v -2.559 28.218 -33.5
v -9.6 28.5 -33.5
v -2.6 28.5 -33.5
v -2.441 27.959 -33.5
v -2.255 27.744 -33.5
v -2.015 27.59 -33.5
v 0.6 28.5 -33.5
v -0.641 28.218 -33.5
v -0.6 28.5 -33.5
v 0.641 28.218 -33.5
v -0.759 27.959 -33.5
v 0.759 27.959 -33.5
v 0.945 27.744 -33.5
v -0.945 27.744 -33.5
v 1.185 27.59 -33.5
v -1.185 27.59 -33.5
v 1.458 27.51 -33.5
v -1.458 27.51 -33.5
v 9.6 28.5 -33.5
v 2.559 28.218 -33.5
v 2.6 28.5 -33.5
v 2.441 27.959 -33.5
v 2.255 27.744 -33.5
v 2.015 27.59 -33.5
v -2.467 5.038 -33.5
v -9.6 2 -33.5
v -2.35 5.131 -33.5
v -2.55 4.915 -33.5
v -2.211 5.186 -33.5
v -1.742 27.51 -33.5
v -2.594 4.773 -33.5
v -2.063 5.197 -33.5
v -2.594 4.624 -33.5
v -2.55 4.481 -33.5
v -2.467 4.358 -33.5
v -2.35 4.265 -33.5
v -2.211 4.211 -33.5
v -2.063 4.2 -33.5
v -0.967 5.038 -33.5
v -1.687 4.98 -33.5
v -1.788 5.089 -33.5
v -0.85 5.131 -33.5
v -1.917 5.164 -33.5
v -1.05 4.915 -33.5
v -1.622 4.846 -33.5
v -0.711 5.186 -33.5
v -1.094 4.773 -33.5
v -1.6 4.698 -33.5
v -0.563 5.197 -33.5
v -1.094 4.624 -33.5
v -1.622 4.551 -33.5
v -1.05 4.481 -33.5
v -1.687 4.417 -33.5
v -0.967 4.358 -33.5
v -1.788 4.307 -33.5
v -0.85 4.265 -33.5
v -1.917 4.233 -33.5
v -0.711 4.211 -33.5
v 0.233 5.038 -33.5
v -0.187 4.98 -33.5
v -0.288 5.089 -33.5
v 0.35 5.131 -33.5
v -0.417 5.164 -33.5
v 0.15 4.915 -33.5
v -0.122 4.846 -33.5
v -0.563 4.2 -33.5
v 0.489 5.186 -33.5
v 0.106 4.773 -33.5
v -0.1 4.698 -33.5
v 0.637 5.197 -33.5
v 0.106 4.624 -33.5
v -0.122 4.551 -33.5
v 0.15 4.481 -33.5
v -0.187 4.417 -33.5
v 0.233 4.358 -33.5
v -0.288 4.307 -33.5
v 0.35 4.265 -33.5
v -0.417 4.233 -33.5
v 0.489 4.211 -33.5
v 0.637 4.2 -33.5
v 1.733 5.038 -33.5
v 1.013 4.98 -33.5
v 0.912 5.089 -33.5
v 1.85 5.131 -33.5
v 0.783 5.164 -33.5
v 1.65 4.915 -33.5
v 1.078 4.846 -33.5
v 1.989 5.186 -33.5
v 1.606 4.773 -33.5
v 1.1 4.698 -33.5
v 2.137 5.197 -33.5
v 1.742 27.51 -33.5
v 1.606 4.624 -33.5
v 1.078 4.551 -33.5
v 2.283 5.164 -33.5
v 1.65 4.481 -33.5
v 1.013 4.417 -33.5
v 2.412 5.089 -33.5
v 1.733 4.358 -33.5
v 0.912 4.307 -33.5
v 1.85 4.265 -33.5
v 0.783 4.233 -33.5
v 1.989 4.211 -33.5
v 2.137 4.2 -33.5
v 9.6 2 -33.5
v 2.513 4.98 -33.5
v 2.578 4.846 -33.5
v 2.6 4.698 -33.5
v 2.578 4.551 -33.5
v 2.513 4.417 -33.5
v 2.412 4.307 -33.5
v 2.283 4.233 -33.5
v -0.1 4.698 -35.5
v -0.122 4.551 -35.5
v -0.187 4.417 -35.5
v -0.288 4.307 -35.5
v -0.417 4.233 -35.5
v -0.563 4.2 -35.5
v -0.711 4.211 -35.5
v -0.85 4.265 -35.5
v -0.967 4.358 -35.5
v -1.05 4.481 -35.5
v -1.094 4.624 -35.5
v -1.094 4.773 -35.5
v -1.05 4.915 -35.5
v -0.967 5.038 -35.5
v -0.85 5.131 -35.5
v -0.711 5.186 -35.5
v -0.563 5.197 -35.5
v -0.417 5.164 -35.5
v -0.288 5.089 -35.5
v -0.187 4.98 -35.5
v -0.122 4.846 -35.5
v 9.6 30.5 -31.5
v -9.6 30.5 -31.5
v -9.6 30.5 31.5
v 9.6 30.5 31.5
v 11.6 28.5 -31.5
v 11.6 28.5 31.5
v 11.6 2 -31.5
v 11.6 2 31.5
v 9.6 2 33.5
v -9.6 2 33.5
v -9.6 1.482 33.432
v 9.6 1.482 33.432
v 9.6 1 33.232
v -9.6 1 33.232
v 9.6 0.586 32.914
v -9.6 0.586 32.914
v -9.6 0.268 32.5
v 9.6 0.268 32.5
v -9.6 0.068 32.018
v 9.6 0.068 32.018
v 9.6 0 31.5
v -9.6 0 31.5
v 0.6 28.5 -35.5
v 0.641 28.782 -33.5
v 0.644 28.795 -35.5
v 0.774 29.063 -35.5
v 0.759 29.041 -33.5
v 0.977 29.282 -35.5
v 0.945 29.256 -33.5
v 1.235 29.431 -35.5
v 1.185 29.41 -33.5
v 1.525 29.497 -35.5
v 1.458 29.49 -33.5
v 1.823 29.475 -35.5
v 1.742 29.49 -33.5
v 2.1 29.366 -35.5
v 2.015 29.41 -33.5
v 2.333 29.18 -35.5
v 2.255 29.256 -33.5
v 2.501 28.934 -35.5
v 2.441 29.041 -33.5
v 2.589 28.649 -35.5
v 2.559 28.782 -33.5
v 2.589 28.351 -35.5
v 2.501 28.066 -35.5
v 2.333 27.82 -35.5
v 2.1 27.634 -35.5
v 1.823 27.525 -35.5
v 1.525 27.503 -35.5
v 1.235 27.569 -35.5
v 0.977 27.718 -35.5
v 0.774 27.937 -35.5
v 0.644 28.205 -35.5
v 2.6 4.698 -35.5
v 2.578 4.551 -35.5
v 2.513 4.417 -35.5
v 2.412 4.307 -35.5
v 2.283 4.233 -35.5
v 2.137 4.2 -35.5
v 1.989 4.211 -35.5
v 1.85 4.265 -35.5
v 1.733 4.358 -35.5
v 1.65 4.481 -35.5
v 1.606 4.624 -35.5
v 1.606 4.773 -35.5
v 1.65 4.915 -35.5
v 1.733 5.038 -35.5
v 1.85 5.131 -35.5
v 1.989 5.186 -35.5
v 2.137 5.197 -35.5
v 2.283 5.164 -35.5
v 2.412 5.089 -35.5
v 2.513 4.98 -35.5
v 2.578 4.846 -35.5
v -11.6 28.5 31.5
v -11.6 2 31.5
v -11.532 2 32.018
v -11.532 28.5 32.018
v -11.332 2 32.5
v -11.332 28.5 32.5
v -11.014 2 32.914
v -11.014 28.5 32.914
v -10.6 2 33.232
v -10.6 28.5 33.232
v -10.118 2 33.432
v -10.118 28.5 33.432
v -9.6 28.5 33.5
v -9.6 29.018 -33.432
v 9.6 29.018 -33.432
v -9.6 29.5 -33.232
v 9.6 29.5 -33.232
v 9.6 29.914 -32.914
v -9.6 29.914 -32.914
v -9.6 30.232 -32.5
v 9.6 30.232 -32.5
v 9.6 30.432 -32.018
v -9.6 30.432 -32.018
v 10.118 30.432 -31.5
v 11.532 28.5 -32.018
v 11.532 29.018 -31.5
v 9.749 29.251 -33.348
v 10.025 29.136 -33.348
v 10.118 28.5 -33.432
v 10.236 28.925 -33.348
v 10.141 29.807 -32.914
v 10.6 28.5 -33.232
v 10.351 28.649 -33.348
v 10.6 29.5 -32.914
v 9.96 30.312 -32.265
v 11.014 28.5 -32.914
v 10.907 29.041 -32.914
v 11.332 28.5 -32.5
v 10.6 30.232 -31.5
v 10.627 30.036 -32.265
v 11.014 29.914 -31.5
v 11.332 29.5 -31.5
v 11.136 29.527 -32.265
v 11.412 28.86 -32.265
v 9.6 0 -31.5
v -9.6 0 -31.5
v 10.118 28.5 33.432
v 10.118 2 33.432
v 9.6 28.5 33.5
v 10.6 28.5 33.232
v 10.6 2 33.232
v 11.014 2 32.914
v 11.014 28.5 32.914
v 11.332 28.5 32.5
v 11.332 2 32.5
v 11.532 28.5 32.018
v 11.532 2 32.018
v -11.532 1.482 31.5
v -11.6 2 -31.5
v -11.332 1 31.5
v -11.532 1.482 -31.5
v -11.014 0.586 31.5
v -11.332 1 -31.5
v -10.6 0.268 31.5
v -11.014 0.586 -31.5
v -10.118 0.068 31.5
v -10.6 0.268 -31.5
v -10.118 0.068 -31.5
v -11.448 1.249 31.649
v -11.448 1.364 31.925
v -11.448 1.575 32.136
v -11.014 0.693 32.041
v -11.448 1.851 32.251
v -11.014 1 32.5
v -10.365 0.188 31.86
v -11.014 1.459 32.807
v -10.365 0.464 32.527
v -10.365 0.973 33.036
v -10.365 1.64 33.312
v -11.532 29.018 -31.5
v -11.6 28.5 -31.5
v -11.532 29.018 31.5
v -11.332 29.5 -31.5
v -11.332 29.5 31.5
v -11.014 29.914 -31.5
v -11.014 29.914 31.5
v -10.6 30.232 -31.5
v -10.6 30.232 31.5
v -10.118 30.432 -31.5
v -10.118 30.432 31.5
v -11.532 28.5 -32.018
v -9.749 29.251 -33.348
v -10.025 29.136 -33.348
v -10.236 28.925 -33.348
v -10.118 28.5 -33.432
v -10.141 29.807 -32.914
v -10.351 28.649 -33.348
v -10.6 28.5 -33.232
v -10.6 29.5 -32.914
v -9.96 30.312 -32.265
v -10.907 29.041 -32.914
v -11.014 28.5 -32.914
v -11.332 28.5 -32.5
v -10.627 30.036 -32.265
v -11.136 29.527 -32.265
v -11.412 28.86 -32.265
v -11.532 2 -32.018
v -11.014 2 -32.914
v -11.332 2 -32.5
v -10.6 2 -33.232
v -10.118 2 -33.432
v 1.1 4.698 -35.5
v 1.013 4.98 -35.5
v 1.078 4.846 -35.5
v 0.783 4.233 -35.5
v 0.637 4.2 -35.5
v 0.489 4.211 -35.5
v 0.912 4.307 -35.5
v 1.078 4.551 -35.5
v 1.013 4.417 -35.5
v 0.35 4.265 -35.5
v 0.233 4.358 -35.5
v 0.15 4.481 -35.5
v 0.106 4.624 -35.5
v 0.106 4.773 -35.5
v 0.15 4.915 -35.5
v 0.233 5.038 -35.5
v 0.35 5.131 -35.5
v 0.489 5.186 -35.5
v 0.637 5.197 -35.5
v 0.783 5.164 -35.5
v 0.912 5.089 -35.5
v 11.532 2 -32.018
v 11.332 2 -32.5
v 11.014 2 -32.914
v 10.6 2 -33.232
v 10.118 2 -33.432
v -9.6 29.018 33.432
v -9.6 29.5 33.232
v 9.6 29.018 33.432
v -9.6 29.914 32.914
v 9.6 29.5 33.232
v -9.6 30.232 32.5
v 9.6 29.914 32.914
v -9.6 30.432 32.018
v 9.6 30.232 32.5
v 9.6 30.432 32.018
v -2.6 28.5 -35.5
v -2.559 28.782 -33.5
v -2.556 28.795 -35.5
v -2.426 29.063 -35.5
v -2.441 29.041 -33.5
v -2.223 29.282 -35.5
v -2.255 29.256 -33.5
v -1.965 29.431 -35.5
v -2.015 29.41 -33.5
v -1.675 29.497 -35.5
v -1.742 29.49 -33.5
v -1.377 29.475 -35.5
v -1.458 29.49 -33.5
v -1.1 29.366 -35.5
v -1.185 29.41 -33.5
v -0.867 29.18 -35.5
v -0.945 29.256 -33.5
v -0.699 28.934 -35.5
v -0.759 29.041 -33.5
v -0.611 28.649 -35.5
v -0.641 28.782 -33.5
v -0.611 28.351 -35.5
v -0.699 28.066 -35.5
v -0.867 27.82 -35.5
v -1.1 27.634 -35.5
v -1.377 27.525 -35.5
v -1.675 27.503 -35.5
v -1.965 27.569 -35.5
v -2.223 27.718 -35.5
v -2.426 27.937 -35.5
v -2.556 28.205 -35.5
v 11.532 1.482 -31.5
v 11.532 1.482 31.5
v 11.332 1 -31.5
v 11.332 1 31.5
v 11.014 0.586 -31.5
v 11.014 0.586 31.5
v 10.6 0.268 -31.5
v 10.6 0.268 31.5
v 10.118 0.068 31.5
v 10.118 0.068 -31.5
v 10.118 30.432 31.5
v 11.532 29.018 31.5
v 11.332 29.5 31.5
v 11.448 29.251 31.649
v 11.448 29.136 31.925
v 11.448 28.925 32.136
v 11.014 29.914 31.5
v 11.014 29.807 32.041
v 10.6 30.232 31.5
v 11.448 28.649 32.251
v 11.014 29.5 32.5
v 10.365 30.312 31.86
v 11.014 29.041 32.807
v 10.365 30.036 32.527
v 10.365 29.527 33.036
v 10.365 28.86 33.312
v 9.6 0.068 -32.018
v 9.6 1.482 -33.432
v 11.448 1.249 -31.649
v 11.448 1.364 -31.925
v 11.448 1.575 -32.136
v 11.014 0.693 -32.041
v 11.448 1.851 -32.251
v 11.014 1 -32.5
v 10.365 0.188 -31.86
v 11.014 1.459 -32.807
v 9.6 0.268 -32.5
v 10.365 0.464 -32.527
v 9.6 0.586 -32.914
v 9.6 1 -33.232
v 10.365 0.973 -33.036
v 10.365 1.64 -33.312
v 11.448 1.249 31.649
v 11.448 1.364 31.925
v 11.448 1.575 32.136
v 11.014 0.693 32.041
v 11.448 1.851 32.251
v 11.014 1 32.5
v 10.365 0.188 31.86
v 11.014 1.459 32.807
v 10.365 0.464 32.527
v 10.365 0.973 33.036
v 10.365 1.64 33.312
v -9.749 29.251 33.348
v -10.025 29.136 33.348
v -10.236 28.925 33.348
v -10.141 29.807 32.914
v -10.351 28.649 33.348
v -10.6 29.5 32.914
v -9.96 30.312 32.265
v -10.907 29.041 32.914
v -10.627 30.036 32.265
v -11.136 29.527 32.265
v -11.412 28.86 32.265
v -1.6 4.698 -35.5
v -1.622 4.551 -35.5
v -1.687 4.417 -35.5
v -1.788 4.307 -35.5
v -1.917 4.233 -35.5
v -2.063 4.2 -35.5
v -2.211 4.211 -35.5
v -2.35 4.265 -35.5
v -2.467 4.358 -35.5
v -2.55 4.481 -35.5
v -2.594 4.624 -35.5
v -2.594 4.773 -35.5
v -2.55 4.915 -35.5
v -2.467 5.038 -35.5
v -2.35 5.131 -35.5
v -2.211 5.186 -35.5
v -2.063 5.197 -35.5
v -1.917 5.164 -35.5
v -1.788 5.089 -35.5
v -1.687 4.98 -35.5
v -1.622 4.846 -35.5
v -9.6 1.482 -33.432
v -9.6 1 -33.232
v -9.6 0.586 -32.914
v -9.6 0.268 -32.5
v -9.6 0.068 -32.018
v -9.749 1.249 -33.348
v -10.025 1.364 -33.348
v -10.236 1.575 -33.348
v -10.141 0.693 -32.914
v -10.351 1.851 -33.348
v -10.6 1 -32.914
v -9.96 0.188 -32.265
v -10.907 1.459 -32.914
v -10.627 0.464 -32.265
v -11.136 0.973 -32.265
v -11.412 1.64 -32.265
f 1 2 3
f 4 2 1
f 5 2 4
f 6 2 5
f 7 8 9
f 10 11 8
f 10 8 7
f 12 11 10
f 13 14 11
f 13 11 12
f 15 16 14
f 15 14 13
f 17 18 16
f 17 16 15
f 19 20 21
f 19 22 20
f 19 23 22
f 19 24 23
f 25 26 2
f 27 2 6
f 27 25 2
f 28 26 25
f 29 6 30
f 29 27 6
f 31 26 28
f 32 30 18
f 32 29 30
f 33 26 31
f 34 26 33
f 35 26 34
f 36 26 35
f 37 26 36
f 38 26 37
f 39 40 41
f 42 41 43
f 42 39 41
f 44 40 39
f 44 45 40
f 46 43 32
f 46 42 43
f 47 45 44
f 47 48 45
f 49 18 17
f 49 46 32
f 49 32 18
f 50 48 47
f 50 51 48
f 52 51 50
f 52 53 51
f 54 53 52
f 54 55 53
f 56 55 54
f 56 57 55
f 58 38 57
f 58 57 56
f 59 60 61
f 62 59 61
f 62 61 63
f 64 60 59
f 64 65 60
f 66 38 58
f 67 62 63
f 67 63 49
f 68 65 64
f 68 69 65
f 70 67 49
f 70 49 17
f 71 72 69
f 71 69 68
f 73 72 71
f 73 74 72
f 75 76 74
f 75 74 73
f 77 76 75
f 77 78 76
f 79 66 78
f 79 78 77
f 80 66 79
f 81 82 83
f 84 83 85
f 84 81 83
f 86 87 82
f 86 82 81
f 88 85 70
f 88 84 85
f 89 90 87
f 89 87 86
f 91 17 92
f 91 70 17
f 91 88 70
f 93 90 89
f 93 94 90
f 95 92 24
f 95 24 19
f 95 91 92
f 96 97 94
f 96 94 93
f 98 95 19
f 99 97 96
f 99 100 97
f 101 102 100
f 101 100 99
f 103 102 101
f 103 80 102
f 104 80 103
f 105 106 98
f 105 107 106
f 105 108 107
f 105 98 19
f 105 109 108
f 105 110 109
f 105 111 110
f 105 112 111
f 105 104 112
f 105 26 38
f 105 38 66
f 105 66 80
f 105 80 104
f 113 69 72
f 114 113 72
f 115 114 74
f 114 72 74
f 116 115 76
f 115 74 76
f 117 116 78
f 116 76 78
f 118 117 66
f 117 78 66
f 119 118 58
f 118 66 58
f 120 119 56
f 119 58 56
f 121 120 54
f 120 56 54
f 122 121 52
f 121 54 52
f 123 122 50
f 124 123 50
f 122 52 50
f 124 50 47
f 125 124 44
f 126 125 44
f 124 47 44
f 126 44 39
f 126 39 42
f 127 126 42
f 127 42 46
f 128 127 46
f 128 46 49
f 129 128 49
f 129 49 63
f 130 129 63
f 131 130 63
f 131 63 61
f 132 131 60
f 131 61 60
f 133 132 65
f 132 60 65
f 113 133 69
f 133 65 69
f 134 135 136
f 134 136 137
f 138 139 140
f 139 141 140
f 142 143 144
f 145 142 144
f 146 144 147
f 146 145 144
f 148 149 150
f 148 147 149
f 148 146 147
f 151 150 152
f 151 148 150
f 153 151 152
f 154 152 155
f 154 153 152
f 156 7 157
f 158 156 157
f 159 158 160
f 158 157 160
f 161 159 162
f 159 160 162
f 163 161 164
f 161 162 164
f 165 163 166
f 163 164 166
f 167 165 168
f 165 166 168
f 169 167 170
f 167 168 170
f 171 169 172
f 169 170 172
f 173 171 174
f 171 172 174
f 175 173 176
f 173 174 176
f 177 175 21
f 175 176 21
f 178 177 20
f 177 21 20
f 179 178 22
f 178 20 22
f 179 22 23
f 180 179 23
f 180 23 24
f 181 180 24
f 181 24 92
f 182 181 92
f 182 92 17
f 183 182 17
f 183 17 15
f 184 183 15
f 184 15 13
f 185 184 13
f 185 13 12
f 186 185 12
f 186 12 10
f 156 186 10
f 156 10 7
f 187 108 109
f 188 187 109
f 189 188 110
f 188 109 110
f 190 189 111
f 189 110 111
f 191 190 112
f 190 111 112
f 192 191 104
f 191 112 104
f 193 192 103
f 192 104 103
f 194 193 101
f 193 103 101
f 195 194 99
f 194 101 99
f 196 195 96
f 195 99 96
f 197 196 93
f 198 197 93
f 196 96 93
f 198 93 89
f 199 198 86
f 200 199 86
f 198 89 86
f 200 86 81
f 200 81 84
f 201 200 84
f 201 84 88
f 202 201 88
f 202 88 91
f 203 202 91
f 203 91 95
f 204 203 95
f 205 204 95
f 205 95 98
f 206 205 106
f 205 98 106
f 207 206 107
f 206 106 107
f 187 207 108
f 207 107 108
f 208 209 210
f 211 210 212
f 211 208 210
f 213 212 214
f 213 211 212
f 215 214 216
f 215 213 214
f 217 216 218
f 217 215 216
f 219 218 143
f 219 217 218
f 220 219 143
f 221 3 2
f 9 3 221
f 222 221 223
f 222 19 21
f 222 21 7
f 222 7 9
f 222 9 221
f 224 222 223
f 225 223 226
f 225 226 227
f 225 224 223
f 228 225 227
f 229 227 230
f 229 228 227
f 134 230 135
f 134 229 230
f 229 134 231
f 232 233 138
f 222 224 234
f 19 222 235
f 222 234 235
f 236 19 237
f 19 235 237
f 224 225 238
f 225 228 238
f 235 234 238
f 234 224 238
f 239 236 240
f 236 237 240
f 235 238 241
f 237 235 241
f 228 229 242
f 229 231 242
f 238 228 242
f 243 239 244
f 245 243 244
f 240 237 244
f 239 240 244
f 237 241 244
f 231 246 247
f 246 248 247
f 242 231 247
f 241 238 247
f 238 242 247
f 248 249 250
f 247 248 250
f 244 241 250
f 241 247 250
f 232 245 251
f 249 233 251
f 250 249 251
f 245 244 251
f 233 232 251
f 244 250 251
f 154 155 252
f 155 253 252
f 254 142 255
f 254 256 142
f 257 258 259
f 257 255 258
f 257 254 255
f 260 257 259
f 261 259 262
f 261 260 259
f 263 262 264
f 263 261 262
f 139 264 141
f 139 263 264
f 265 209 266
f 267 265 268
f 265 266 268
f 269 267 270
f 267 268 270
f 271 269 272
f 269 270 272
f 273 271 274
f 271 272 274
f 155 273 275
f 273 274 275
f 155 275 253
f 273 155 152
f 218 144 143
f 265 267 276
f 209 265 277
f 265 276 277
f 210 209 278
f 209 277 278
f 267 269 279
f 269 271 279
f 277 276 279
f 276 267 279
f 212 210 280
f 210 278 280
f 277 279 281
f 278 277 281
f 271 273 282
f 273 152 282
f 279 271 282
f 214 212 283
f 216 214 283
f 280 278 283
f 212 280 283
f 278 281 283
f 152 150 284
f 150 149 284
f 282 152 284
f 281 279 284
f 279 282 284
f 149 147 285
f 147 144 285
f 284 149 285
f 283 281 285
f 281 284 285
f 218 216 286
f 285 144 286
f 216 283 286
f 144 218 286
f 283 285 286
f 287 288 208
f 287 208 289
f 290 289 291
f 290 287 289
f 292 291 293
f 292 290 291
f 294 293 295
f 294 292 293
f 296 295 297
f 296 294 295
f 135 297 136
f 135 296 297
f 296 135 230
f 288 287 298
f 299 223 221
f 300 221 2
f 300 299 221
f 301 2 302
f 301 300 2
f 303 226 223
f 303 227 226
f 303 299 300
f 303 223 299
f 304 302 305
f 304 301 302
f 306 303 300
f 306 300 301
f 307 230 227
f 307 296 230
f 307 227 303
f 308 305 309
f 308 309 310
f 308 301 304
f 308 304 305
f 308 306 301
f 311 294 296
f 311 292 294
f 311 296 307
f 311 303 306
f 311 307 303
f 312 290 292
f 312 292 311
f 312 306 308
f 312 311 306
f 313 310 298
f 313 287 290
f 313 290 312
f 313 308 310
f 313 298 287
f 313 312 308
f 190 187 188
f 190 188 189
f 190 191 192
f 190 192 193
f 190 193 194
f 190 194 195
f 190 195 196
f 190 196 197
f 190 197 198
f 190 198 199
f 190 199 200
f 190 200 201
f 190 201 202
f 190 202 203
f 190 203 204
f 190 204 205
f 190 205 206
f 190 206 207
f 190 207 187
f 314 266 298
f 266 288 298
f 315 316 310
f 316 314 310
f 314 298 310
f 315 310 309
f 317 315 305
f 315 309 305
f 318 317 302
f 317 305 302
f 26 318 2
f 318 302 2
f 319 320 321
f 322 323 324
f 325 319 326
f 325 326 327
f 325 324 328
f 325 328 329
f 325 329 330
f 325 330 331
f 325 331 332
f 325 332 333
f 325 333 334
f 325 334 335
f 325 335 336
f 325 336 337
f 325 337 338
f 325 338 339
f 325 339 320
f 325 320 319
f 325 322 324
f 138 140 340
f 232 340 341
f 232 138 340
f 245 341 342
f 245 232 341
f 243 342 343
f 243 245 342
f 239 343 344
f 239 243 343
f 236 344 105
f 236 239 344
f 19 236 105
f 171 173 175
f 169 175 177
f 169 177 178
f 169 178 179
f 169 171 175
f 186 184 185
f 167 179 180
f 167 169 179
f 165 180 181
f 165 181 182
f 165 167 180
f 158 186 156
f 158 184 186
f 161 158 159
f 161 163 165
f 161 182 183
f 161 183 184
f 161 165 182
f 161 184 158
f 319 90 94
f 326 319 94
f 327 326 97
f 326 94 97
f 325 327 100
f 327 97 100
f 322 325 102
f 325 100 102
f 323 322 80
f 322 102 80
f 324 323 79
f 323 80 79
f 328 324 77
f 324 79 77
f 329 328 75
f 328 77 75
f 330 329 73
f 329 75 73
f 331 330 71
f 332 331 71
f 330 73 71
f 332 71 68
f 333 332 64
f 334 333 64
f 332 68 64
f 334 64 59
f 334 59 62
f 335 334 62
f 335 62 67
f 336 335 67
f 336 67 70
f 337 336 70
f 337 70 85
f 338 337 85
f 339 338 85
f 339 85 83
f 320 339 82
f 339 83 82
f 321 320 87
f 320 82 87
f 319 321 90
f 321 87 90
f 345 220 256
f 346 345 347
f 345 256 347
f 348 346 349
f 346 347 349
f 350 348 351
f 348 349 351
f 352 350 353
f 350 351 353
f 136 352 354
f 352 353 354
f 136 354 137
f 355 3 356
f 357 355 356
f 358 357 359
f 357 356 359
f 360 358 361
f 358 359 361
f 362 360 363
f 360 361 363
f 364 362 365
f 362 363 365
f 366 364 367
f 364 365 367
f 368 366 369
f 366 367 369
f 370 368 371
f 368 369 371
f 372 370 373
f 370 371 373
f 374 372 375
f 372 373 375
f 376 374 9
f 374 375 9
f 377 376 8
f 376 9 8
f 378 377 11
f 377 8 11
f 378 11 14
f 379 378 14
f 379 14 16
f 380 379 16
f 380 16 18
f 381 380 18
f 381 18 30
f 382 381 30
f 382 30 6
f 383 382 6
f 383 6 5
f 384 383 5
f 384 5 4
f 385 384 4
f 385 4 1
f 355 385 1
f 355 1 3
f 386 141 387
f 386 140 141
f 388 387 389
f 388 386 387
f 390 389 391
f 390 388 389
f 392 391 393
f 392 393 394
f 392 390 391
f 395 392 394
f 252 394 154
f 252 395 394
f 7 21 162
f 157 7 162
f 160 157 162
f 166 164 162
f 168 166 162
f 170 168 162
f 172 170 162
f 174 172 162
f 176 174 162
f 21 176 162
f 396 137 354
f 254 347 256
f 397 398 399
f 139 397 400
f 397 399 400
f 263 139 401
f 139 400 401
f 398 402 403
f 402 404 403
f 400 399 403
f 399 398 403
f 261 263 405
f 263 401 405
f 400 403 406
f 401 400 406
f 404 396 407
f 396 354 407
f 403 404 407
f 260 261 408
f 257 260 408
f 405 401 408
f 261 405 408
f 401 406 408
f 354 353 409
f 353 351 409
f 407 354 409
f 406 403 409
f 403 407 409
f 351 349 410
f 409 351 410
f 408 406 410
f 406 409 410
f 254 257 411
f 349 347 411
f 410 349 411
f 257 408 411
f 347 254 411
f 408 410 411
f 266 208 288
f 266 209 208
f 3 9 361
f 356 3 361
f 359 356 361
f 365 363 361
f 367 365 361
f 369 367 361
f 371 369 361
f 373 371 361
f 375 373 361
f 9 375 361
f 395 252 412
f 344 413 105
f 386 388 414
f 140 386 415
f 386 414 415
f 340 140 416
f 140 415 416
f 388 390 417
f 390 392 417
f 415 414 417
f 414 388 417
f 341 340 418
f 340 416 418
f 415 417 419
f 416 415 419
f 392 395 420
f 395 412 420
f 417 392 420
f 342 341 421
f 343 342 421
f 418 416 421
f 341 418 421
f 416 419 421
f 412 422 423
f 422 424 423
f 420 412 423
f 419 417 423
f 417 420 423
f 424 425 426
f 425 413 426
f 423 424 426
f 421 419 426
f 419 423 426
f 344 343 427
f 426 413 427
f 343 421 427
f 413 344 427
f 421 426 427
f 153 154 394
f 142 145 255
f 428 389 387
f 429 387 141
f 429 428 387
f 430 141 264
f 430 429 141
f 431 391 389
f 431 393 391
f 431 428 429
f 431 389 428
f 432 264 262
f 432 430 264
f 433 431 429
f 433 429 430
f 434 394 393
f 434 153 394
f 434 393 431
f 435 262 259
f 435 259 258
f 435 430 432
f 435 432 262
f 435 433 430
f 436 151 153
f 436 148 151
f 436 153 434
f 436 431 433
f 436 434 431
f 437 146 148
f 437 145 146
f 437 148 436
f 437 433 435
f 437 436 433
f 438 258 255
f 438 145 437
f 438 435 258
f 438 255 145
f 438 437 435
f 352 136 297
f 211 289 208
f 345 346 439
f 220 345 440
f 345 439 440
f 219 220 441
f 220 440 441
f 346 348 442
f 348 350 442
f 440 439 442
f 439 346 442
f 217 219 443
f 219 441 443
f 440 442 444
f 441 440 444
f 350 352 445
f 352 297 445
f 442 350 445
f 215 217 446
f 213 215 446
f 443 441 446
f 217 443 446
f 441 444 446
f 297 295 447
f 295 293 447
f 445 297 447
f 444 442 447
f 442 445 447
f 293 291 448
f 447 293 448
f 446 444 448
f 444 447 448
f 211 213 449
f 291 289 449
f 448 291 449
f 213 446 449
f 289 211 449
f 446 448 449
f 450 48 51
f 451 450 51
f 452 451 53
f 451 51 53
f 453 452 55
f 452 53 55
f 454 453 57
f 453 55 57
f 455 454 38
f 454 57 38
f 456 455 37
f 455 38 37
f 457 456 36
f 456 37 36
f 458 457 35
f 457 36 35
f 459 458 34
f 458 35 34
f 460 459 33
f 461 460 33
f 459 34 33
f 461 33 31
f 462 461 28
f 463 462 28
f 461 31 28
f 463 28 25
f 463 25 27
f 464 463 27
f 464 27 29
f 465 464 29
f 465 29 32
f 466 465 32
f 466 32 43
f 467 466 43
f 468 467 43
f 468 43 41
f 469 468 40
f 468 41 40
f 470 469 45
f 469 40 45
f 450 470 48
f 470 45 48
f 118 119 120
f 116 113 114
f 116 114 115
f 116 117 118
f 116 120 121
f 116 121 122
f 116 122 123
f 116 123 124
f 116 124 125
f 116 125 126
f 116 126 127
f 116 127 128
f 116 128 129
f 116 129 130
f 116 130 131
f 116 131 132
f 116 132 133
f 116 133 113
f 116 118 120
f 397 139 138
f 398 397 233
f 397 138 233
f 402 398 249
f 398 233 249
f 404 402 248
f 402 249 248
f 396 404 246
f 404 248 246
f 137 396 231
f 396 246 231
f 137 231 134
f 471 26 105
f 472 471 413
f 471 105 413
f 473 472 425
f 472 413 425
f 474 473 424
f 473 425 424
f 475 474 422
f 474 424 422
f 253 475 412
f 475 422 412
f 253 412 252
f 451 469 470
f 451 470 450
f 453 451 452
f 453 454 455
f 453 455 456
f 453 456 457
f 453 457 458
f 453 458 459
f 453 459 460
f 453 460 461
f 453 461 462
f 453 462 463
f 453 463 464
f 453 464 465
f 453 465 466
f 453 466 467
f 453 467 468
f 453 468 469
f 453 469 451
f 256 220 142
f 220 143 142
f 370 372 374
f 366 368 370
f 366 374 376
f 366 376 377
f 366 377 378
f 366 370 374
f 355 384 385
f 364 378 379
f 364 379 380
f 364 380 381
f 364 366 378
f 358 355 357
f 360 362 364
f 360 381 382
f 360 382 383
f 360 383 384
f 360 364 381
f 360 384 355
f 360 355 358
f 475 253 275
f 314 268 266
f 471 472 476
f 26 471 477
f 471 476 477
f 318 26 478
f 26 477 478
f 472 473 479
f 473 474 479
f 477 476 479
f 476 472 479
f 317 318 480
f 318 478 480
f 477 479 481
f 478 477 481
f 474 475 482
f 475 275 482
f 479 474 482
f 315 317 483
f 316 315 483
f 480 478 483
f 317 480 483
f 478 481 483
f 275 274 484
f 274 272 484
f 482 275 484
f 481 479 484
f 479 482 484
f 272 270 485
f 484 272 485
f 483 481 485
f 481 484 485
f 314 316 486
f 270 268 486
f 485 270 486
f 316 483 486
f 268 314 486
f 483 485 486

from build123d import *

# Parameters (mm, degrees)
SKETCH_1_W      = 23.2
SKETCH_1_H      = 67
EXTRUDE_1_DEPTH = 30.5
FILLET_2_R      = 2
SKETCH_2_R      = 1
SKETCH_2_R_2    = 0.5
EXTRUDE_2_DEPTH = 2


with BuildPart() as part:
    # Эскиз1 → Бобышка-Вытянуть1 (new body)
    with BuildSketch(Plane(origin=(0, 0, 0), x_dir=(1, 0, 0), z_dir=(0, 1, 0))):
        Rectangle(SKETCH_1_W, SKETCH_1_H)
    extrude(amount=EXTRUDE_1_DEPTH)

    # Скругление2
    fillet_2_edges = [part.edges().sort_by_distance(p)[0] for p in [
        (-11.6, 30.5, 0),
        (0, 30.5, 33.5),
        (11.6, 30.5, 0),
        (0, 0, 33.5),
        (-11.6, 0, 0),
        (0, 0, -33.5),
        (11.6, 0, 0),
        (0, 30.5, -33.5),
        (11.6, 15.25, 33.5),
        (-11.6, 15.25, 33.5),
        (-11.6, 15.25, -33.5),
        (11.6, 15.25, -33.5),
    ]]
    fillet(fillet_2_edges, radius=FILLET_2_R)

    # Эскиз2 → Бобышка-Вытянуть2 (add)
    with BuildSketch(Plane(origin=(0, 0, -33.5), x_dir=(-1, 0, 0), z_dir=(0, 0, -1))):
        with Locations((-1.6, 28.5)):
            Circle(SKETCH_2_R)
        with Locations((1.6, 28.5)):
            Circle(SKETCH_2_R)
        with Locations(Location((-0.6, 4.698268405, 0), (0, 0, 180))):
            Circle(SKETCH_2_R_2)
        with Locations(Location((-2.1, 4.698268405, 0), (0, 0, 180))):
            Circle(SKETCH_2_R_2)
        with Locations(Location((0.6, 4.698268405, 0), (0, 0, 180))):
            Circle(SKETCH_2_R_2)
        with Locations(Location((2.1, 4.698268405, 0), (0, 0, 180))):
            Circle(SKETCH_2_R_2)
    extrude(amount=EXTRUDE_2_DEPTH)


solid = part.part
